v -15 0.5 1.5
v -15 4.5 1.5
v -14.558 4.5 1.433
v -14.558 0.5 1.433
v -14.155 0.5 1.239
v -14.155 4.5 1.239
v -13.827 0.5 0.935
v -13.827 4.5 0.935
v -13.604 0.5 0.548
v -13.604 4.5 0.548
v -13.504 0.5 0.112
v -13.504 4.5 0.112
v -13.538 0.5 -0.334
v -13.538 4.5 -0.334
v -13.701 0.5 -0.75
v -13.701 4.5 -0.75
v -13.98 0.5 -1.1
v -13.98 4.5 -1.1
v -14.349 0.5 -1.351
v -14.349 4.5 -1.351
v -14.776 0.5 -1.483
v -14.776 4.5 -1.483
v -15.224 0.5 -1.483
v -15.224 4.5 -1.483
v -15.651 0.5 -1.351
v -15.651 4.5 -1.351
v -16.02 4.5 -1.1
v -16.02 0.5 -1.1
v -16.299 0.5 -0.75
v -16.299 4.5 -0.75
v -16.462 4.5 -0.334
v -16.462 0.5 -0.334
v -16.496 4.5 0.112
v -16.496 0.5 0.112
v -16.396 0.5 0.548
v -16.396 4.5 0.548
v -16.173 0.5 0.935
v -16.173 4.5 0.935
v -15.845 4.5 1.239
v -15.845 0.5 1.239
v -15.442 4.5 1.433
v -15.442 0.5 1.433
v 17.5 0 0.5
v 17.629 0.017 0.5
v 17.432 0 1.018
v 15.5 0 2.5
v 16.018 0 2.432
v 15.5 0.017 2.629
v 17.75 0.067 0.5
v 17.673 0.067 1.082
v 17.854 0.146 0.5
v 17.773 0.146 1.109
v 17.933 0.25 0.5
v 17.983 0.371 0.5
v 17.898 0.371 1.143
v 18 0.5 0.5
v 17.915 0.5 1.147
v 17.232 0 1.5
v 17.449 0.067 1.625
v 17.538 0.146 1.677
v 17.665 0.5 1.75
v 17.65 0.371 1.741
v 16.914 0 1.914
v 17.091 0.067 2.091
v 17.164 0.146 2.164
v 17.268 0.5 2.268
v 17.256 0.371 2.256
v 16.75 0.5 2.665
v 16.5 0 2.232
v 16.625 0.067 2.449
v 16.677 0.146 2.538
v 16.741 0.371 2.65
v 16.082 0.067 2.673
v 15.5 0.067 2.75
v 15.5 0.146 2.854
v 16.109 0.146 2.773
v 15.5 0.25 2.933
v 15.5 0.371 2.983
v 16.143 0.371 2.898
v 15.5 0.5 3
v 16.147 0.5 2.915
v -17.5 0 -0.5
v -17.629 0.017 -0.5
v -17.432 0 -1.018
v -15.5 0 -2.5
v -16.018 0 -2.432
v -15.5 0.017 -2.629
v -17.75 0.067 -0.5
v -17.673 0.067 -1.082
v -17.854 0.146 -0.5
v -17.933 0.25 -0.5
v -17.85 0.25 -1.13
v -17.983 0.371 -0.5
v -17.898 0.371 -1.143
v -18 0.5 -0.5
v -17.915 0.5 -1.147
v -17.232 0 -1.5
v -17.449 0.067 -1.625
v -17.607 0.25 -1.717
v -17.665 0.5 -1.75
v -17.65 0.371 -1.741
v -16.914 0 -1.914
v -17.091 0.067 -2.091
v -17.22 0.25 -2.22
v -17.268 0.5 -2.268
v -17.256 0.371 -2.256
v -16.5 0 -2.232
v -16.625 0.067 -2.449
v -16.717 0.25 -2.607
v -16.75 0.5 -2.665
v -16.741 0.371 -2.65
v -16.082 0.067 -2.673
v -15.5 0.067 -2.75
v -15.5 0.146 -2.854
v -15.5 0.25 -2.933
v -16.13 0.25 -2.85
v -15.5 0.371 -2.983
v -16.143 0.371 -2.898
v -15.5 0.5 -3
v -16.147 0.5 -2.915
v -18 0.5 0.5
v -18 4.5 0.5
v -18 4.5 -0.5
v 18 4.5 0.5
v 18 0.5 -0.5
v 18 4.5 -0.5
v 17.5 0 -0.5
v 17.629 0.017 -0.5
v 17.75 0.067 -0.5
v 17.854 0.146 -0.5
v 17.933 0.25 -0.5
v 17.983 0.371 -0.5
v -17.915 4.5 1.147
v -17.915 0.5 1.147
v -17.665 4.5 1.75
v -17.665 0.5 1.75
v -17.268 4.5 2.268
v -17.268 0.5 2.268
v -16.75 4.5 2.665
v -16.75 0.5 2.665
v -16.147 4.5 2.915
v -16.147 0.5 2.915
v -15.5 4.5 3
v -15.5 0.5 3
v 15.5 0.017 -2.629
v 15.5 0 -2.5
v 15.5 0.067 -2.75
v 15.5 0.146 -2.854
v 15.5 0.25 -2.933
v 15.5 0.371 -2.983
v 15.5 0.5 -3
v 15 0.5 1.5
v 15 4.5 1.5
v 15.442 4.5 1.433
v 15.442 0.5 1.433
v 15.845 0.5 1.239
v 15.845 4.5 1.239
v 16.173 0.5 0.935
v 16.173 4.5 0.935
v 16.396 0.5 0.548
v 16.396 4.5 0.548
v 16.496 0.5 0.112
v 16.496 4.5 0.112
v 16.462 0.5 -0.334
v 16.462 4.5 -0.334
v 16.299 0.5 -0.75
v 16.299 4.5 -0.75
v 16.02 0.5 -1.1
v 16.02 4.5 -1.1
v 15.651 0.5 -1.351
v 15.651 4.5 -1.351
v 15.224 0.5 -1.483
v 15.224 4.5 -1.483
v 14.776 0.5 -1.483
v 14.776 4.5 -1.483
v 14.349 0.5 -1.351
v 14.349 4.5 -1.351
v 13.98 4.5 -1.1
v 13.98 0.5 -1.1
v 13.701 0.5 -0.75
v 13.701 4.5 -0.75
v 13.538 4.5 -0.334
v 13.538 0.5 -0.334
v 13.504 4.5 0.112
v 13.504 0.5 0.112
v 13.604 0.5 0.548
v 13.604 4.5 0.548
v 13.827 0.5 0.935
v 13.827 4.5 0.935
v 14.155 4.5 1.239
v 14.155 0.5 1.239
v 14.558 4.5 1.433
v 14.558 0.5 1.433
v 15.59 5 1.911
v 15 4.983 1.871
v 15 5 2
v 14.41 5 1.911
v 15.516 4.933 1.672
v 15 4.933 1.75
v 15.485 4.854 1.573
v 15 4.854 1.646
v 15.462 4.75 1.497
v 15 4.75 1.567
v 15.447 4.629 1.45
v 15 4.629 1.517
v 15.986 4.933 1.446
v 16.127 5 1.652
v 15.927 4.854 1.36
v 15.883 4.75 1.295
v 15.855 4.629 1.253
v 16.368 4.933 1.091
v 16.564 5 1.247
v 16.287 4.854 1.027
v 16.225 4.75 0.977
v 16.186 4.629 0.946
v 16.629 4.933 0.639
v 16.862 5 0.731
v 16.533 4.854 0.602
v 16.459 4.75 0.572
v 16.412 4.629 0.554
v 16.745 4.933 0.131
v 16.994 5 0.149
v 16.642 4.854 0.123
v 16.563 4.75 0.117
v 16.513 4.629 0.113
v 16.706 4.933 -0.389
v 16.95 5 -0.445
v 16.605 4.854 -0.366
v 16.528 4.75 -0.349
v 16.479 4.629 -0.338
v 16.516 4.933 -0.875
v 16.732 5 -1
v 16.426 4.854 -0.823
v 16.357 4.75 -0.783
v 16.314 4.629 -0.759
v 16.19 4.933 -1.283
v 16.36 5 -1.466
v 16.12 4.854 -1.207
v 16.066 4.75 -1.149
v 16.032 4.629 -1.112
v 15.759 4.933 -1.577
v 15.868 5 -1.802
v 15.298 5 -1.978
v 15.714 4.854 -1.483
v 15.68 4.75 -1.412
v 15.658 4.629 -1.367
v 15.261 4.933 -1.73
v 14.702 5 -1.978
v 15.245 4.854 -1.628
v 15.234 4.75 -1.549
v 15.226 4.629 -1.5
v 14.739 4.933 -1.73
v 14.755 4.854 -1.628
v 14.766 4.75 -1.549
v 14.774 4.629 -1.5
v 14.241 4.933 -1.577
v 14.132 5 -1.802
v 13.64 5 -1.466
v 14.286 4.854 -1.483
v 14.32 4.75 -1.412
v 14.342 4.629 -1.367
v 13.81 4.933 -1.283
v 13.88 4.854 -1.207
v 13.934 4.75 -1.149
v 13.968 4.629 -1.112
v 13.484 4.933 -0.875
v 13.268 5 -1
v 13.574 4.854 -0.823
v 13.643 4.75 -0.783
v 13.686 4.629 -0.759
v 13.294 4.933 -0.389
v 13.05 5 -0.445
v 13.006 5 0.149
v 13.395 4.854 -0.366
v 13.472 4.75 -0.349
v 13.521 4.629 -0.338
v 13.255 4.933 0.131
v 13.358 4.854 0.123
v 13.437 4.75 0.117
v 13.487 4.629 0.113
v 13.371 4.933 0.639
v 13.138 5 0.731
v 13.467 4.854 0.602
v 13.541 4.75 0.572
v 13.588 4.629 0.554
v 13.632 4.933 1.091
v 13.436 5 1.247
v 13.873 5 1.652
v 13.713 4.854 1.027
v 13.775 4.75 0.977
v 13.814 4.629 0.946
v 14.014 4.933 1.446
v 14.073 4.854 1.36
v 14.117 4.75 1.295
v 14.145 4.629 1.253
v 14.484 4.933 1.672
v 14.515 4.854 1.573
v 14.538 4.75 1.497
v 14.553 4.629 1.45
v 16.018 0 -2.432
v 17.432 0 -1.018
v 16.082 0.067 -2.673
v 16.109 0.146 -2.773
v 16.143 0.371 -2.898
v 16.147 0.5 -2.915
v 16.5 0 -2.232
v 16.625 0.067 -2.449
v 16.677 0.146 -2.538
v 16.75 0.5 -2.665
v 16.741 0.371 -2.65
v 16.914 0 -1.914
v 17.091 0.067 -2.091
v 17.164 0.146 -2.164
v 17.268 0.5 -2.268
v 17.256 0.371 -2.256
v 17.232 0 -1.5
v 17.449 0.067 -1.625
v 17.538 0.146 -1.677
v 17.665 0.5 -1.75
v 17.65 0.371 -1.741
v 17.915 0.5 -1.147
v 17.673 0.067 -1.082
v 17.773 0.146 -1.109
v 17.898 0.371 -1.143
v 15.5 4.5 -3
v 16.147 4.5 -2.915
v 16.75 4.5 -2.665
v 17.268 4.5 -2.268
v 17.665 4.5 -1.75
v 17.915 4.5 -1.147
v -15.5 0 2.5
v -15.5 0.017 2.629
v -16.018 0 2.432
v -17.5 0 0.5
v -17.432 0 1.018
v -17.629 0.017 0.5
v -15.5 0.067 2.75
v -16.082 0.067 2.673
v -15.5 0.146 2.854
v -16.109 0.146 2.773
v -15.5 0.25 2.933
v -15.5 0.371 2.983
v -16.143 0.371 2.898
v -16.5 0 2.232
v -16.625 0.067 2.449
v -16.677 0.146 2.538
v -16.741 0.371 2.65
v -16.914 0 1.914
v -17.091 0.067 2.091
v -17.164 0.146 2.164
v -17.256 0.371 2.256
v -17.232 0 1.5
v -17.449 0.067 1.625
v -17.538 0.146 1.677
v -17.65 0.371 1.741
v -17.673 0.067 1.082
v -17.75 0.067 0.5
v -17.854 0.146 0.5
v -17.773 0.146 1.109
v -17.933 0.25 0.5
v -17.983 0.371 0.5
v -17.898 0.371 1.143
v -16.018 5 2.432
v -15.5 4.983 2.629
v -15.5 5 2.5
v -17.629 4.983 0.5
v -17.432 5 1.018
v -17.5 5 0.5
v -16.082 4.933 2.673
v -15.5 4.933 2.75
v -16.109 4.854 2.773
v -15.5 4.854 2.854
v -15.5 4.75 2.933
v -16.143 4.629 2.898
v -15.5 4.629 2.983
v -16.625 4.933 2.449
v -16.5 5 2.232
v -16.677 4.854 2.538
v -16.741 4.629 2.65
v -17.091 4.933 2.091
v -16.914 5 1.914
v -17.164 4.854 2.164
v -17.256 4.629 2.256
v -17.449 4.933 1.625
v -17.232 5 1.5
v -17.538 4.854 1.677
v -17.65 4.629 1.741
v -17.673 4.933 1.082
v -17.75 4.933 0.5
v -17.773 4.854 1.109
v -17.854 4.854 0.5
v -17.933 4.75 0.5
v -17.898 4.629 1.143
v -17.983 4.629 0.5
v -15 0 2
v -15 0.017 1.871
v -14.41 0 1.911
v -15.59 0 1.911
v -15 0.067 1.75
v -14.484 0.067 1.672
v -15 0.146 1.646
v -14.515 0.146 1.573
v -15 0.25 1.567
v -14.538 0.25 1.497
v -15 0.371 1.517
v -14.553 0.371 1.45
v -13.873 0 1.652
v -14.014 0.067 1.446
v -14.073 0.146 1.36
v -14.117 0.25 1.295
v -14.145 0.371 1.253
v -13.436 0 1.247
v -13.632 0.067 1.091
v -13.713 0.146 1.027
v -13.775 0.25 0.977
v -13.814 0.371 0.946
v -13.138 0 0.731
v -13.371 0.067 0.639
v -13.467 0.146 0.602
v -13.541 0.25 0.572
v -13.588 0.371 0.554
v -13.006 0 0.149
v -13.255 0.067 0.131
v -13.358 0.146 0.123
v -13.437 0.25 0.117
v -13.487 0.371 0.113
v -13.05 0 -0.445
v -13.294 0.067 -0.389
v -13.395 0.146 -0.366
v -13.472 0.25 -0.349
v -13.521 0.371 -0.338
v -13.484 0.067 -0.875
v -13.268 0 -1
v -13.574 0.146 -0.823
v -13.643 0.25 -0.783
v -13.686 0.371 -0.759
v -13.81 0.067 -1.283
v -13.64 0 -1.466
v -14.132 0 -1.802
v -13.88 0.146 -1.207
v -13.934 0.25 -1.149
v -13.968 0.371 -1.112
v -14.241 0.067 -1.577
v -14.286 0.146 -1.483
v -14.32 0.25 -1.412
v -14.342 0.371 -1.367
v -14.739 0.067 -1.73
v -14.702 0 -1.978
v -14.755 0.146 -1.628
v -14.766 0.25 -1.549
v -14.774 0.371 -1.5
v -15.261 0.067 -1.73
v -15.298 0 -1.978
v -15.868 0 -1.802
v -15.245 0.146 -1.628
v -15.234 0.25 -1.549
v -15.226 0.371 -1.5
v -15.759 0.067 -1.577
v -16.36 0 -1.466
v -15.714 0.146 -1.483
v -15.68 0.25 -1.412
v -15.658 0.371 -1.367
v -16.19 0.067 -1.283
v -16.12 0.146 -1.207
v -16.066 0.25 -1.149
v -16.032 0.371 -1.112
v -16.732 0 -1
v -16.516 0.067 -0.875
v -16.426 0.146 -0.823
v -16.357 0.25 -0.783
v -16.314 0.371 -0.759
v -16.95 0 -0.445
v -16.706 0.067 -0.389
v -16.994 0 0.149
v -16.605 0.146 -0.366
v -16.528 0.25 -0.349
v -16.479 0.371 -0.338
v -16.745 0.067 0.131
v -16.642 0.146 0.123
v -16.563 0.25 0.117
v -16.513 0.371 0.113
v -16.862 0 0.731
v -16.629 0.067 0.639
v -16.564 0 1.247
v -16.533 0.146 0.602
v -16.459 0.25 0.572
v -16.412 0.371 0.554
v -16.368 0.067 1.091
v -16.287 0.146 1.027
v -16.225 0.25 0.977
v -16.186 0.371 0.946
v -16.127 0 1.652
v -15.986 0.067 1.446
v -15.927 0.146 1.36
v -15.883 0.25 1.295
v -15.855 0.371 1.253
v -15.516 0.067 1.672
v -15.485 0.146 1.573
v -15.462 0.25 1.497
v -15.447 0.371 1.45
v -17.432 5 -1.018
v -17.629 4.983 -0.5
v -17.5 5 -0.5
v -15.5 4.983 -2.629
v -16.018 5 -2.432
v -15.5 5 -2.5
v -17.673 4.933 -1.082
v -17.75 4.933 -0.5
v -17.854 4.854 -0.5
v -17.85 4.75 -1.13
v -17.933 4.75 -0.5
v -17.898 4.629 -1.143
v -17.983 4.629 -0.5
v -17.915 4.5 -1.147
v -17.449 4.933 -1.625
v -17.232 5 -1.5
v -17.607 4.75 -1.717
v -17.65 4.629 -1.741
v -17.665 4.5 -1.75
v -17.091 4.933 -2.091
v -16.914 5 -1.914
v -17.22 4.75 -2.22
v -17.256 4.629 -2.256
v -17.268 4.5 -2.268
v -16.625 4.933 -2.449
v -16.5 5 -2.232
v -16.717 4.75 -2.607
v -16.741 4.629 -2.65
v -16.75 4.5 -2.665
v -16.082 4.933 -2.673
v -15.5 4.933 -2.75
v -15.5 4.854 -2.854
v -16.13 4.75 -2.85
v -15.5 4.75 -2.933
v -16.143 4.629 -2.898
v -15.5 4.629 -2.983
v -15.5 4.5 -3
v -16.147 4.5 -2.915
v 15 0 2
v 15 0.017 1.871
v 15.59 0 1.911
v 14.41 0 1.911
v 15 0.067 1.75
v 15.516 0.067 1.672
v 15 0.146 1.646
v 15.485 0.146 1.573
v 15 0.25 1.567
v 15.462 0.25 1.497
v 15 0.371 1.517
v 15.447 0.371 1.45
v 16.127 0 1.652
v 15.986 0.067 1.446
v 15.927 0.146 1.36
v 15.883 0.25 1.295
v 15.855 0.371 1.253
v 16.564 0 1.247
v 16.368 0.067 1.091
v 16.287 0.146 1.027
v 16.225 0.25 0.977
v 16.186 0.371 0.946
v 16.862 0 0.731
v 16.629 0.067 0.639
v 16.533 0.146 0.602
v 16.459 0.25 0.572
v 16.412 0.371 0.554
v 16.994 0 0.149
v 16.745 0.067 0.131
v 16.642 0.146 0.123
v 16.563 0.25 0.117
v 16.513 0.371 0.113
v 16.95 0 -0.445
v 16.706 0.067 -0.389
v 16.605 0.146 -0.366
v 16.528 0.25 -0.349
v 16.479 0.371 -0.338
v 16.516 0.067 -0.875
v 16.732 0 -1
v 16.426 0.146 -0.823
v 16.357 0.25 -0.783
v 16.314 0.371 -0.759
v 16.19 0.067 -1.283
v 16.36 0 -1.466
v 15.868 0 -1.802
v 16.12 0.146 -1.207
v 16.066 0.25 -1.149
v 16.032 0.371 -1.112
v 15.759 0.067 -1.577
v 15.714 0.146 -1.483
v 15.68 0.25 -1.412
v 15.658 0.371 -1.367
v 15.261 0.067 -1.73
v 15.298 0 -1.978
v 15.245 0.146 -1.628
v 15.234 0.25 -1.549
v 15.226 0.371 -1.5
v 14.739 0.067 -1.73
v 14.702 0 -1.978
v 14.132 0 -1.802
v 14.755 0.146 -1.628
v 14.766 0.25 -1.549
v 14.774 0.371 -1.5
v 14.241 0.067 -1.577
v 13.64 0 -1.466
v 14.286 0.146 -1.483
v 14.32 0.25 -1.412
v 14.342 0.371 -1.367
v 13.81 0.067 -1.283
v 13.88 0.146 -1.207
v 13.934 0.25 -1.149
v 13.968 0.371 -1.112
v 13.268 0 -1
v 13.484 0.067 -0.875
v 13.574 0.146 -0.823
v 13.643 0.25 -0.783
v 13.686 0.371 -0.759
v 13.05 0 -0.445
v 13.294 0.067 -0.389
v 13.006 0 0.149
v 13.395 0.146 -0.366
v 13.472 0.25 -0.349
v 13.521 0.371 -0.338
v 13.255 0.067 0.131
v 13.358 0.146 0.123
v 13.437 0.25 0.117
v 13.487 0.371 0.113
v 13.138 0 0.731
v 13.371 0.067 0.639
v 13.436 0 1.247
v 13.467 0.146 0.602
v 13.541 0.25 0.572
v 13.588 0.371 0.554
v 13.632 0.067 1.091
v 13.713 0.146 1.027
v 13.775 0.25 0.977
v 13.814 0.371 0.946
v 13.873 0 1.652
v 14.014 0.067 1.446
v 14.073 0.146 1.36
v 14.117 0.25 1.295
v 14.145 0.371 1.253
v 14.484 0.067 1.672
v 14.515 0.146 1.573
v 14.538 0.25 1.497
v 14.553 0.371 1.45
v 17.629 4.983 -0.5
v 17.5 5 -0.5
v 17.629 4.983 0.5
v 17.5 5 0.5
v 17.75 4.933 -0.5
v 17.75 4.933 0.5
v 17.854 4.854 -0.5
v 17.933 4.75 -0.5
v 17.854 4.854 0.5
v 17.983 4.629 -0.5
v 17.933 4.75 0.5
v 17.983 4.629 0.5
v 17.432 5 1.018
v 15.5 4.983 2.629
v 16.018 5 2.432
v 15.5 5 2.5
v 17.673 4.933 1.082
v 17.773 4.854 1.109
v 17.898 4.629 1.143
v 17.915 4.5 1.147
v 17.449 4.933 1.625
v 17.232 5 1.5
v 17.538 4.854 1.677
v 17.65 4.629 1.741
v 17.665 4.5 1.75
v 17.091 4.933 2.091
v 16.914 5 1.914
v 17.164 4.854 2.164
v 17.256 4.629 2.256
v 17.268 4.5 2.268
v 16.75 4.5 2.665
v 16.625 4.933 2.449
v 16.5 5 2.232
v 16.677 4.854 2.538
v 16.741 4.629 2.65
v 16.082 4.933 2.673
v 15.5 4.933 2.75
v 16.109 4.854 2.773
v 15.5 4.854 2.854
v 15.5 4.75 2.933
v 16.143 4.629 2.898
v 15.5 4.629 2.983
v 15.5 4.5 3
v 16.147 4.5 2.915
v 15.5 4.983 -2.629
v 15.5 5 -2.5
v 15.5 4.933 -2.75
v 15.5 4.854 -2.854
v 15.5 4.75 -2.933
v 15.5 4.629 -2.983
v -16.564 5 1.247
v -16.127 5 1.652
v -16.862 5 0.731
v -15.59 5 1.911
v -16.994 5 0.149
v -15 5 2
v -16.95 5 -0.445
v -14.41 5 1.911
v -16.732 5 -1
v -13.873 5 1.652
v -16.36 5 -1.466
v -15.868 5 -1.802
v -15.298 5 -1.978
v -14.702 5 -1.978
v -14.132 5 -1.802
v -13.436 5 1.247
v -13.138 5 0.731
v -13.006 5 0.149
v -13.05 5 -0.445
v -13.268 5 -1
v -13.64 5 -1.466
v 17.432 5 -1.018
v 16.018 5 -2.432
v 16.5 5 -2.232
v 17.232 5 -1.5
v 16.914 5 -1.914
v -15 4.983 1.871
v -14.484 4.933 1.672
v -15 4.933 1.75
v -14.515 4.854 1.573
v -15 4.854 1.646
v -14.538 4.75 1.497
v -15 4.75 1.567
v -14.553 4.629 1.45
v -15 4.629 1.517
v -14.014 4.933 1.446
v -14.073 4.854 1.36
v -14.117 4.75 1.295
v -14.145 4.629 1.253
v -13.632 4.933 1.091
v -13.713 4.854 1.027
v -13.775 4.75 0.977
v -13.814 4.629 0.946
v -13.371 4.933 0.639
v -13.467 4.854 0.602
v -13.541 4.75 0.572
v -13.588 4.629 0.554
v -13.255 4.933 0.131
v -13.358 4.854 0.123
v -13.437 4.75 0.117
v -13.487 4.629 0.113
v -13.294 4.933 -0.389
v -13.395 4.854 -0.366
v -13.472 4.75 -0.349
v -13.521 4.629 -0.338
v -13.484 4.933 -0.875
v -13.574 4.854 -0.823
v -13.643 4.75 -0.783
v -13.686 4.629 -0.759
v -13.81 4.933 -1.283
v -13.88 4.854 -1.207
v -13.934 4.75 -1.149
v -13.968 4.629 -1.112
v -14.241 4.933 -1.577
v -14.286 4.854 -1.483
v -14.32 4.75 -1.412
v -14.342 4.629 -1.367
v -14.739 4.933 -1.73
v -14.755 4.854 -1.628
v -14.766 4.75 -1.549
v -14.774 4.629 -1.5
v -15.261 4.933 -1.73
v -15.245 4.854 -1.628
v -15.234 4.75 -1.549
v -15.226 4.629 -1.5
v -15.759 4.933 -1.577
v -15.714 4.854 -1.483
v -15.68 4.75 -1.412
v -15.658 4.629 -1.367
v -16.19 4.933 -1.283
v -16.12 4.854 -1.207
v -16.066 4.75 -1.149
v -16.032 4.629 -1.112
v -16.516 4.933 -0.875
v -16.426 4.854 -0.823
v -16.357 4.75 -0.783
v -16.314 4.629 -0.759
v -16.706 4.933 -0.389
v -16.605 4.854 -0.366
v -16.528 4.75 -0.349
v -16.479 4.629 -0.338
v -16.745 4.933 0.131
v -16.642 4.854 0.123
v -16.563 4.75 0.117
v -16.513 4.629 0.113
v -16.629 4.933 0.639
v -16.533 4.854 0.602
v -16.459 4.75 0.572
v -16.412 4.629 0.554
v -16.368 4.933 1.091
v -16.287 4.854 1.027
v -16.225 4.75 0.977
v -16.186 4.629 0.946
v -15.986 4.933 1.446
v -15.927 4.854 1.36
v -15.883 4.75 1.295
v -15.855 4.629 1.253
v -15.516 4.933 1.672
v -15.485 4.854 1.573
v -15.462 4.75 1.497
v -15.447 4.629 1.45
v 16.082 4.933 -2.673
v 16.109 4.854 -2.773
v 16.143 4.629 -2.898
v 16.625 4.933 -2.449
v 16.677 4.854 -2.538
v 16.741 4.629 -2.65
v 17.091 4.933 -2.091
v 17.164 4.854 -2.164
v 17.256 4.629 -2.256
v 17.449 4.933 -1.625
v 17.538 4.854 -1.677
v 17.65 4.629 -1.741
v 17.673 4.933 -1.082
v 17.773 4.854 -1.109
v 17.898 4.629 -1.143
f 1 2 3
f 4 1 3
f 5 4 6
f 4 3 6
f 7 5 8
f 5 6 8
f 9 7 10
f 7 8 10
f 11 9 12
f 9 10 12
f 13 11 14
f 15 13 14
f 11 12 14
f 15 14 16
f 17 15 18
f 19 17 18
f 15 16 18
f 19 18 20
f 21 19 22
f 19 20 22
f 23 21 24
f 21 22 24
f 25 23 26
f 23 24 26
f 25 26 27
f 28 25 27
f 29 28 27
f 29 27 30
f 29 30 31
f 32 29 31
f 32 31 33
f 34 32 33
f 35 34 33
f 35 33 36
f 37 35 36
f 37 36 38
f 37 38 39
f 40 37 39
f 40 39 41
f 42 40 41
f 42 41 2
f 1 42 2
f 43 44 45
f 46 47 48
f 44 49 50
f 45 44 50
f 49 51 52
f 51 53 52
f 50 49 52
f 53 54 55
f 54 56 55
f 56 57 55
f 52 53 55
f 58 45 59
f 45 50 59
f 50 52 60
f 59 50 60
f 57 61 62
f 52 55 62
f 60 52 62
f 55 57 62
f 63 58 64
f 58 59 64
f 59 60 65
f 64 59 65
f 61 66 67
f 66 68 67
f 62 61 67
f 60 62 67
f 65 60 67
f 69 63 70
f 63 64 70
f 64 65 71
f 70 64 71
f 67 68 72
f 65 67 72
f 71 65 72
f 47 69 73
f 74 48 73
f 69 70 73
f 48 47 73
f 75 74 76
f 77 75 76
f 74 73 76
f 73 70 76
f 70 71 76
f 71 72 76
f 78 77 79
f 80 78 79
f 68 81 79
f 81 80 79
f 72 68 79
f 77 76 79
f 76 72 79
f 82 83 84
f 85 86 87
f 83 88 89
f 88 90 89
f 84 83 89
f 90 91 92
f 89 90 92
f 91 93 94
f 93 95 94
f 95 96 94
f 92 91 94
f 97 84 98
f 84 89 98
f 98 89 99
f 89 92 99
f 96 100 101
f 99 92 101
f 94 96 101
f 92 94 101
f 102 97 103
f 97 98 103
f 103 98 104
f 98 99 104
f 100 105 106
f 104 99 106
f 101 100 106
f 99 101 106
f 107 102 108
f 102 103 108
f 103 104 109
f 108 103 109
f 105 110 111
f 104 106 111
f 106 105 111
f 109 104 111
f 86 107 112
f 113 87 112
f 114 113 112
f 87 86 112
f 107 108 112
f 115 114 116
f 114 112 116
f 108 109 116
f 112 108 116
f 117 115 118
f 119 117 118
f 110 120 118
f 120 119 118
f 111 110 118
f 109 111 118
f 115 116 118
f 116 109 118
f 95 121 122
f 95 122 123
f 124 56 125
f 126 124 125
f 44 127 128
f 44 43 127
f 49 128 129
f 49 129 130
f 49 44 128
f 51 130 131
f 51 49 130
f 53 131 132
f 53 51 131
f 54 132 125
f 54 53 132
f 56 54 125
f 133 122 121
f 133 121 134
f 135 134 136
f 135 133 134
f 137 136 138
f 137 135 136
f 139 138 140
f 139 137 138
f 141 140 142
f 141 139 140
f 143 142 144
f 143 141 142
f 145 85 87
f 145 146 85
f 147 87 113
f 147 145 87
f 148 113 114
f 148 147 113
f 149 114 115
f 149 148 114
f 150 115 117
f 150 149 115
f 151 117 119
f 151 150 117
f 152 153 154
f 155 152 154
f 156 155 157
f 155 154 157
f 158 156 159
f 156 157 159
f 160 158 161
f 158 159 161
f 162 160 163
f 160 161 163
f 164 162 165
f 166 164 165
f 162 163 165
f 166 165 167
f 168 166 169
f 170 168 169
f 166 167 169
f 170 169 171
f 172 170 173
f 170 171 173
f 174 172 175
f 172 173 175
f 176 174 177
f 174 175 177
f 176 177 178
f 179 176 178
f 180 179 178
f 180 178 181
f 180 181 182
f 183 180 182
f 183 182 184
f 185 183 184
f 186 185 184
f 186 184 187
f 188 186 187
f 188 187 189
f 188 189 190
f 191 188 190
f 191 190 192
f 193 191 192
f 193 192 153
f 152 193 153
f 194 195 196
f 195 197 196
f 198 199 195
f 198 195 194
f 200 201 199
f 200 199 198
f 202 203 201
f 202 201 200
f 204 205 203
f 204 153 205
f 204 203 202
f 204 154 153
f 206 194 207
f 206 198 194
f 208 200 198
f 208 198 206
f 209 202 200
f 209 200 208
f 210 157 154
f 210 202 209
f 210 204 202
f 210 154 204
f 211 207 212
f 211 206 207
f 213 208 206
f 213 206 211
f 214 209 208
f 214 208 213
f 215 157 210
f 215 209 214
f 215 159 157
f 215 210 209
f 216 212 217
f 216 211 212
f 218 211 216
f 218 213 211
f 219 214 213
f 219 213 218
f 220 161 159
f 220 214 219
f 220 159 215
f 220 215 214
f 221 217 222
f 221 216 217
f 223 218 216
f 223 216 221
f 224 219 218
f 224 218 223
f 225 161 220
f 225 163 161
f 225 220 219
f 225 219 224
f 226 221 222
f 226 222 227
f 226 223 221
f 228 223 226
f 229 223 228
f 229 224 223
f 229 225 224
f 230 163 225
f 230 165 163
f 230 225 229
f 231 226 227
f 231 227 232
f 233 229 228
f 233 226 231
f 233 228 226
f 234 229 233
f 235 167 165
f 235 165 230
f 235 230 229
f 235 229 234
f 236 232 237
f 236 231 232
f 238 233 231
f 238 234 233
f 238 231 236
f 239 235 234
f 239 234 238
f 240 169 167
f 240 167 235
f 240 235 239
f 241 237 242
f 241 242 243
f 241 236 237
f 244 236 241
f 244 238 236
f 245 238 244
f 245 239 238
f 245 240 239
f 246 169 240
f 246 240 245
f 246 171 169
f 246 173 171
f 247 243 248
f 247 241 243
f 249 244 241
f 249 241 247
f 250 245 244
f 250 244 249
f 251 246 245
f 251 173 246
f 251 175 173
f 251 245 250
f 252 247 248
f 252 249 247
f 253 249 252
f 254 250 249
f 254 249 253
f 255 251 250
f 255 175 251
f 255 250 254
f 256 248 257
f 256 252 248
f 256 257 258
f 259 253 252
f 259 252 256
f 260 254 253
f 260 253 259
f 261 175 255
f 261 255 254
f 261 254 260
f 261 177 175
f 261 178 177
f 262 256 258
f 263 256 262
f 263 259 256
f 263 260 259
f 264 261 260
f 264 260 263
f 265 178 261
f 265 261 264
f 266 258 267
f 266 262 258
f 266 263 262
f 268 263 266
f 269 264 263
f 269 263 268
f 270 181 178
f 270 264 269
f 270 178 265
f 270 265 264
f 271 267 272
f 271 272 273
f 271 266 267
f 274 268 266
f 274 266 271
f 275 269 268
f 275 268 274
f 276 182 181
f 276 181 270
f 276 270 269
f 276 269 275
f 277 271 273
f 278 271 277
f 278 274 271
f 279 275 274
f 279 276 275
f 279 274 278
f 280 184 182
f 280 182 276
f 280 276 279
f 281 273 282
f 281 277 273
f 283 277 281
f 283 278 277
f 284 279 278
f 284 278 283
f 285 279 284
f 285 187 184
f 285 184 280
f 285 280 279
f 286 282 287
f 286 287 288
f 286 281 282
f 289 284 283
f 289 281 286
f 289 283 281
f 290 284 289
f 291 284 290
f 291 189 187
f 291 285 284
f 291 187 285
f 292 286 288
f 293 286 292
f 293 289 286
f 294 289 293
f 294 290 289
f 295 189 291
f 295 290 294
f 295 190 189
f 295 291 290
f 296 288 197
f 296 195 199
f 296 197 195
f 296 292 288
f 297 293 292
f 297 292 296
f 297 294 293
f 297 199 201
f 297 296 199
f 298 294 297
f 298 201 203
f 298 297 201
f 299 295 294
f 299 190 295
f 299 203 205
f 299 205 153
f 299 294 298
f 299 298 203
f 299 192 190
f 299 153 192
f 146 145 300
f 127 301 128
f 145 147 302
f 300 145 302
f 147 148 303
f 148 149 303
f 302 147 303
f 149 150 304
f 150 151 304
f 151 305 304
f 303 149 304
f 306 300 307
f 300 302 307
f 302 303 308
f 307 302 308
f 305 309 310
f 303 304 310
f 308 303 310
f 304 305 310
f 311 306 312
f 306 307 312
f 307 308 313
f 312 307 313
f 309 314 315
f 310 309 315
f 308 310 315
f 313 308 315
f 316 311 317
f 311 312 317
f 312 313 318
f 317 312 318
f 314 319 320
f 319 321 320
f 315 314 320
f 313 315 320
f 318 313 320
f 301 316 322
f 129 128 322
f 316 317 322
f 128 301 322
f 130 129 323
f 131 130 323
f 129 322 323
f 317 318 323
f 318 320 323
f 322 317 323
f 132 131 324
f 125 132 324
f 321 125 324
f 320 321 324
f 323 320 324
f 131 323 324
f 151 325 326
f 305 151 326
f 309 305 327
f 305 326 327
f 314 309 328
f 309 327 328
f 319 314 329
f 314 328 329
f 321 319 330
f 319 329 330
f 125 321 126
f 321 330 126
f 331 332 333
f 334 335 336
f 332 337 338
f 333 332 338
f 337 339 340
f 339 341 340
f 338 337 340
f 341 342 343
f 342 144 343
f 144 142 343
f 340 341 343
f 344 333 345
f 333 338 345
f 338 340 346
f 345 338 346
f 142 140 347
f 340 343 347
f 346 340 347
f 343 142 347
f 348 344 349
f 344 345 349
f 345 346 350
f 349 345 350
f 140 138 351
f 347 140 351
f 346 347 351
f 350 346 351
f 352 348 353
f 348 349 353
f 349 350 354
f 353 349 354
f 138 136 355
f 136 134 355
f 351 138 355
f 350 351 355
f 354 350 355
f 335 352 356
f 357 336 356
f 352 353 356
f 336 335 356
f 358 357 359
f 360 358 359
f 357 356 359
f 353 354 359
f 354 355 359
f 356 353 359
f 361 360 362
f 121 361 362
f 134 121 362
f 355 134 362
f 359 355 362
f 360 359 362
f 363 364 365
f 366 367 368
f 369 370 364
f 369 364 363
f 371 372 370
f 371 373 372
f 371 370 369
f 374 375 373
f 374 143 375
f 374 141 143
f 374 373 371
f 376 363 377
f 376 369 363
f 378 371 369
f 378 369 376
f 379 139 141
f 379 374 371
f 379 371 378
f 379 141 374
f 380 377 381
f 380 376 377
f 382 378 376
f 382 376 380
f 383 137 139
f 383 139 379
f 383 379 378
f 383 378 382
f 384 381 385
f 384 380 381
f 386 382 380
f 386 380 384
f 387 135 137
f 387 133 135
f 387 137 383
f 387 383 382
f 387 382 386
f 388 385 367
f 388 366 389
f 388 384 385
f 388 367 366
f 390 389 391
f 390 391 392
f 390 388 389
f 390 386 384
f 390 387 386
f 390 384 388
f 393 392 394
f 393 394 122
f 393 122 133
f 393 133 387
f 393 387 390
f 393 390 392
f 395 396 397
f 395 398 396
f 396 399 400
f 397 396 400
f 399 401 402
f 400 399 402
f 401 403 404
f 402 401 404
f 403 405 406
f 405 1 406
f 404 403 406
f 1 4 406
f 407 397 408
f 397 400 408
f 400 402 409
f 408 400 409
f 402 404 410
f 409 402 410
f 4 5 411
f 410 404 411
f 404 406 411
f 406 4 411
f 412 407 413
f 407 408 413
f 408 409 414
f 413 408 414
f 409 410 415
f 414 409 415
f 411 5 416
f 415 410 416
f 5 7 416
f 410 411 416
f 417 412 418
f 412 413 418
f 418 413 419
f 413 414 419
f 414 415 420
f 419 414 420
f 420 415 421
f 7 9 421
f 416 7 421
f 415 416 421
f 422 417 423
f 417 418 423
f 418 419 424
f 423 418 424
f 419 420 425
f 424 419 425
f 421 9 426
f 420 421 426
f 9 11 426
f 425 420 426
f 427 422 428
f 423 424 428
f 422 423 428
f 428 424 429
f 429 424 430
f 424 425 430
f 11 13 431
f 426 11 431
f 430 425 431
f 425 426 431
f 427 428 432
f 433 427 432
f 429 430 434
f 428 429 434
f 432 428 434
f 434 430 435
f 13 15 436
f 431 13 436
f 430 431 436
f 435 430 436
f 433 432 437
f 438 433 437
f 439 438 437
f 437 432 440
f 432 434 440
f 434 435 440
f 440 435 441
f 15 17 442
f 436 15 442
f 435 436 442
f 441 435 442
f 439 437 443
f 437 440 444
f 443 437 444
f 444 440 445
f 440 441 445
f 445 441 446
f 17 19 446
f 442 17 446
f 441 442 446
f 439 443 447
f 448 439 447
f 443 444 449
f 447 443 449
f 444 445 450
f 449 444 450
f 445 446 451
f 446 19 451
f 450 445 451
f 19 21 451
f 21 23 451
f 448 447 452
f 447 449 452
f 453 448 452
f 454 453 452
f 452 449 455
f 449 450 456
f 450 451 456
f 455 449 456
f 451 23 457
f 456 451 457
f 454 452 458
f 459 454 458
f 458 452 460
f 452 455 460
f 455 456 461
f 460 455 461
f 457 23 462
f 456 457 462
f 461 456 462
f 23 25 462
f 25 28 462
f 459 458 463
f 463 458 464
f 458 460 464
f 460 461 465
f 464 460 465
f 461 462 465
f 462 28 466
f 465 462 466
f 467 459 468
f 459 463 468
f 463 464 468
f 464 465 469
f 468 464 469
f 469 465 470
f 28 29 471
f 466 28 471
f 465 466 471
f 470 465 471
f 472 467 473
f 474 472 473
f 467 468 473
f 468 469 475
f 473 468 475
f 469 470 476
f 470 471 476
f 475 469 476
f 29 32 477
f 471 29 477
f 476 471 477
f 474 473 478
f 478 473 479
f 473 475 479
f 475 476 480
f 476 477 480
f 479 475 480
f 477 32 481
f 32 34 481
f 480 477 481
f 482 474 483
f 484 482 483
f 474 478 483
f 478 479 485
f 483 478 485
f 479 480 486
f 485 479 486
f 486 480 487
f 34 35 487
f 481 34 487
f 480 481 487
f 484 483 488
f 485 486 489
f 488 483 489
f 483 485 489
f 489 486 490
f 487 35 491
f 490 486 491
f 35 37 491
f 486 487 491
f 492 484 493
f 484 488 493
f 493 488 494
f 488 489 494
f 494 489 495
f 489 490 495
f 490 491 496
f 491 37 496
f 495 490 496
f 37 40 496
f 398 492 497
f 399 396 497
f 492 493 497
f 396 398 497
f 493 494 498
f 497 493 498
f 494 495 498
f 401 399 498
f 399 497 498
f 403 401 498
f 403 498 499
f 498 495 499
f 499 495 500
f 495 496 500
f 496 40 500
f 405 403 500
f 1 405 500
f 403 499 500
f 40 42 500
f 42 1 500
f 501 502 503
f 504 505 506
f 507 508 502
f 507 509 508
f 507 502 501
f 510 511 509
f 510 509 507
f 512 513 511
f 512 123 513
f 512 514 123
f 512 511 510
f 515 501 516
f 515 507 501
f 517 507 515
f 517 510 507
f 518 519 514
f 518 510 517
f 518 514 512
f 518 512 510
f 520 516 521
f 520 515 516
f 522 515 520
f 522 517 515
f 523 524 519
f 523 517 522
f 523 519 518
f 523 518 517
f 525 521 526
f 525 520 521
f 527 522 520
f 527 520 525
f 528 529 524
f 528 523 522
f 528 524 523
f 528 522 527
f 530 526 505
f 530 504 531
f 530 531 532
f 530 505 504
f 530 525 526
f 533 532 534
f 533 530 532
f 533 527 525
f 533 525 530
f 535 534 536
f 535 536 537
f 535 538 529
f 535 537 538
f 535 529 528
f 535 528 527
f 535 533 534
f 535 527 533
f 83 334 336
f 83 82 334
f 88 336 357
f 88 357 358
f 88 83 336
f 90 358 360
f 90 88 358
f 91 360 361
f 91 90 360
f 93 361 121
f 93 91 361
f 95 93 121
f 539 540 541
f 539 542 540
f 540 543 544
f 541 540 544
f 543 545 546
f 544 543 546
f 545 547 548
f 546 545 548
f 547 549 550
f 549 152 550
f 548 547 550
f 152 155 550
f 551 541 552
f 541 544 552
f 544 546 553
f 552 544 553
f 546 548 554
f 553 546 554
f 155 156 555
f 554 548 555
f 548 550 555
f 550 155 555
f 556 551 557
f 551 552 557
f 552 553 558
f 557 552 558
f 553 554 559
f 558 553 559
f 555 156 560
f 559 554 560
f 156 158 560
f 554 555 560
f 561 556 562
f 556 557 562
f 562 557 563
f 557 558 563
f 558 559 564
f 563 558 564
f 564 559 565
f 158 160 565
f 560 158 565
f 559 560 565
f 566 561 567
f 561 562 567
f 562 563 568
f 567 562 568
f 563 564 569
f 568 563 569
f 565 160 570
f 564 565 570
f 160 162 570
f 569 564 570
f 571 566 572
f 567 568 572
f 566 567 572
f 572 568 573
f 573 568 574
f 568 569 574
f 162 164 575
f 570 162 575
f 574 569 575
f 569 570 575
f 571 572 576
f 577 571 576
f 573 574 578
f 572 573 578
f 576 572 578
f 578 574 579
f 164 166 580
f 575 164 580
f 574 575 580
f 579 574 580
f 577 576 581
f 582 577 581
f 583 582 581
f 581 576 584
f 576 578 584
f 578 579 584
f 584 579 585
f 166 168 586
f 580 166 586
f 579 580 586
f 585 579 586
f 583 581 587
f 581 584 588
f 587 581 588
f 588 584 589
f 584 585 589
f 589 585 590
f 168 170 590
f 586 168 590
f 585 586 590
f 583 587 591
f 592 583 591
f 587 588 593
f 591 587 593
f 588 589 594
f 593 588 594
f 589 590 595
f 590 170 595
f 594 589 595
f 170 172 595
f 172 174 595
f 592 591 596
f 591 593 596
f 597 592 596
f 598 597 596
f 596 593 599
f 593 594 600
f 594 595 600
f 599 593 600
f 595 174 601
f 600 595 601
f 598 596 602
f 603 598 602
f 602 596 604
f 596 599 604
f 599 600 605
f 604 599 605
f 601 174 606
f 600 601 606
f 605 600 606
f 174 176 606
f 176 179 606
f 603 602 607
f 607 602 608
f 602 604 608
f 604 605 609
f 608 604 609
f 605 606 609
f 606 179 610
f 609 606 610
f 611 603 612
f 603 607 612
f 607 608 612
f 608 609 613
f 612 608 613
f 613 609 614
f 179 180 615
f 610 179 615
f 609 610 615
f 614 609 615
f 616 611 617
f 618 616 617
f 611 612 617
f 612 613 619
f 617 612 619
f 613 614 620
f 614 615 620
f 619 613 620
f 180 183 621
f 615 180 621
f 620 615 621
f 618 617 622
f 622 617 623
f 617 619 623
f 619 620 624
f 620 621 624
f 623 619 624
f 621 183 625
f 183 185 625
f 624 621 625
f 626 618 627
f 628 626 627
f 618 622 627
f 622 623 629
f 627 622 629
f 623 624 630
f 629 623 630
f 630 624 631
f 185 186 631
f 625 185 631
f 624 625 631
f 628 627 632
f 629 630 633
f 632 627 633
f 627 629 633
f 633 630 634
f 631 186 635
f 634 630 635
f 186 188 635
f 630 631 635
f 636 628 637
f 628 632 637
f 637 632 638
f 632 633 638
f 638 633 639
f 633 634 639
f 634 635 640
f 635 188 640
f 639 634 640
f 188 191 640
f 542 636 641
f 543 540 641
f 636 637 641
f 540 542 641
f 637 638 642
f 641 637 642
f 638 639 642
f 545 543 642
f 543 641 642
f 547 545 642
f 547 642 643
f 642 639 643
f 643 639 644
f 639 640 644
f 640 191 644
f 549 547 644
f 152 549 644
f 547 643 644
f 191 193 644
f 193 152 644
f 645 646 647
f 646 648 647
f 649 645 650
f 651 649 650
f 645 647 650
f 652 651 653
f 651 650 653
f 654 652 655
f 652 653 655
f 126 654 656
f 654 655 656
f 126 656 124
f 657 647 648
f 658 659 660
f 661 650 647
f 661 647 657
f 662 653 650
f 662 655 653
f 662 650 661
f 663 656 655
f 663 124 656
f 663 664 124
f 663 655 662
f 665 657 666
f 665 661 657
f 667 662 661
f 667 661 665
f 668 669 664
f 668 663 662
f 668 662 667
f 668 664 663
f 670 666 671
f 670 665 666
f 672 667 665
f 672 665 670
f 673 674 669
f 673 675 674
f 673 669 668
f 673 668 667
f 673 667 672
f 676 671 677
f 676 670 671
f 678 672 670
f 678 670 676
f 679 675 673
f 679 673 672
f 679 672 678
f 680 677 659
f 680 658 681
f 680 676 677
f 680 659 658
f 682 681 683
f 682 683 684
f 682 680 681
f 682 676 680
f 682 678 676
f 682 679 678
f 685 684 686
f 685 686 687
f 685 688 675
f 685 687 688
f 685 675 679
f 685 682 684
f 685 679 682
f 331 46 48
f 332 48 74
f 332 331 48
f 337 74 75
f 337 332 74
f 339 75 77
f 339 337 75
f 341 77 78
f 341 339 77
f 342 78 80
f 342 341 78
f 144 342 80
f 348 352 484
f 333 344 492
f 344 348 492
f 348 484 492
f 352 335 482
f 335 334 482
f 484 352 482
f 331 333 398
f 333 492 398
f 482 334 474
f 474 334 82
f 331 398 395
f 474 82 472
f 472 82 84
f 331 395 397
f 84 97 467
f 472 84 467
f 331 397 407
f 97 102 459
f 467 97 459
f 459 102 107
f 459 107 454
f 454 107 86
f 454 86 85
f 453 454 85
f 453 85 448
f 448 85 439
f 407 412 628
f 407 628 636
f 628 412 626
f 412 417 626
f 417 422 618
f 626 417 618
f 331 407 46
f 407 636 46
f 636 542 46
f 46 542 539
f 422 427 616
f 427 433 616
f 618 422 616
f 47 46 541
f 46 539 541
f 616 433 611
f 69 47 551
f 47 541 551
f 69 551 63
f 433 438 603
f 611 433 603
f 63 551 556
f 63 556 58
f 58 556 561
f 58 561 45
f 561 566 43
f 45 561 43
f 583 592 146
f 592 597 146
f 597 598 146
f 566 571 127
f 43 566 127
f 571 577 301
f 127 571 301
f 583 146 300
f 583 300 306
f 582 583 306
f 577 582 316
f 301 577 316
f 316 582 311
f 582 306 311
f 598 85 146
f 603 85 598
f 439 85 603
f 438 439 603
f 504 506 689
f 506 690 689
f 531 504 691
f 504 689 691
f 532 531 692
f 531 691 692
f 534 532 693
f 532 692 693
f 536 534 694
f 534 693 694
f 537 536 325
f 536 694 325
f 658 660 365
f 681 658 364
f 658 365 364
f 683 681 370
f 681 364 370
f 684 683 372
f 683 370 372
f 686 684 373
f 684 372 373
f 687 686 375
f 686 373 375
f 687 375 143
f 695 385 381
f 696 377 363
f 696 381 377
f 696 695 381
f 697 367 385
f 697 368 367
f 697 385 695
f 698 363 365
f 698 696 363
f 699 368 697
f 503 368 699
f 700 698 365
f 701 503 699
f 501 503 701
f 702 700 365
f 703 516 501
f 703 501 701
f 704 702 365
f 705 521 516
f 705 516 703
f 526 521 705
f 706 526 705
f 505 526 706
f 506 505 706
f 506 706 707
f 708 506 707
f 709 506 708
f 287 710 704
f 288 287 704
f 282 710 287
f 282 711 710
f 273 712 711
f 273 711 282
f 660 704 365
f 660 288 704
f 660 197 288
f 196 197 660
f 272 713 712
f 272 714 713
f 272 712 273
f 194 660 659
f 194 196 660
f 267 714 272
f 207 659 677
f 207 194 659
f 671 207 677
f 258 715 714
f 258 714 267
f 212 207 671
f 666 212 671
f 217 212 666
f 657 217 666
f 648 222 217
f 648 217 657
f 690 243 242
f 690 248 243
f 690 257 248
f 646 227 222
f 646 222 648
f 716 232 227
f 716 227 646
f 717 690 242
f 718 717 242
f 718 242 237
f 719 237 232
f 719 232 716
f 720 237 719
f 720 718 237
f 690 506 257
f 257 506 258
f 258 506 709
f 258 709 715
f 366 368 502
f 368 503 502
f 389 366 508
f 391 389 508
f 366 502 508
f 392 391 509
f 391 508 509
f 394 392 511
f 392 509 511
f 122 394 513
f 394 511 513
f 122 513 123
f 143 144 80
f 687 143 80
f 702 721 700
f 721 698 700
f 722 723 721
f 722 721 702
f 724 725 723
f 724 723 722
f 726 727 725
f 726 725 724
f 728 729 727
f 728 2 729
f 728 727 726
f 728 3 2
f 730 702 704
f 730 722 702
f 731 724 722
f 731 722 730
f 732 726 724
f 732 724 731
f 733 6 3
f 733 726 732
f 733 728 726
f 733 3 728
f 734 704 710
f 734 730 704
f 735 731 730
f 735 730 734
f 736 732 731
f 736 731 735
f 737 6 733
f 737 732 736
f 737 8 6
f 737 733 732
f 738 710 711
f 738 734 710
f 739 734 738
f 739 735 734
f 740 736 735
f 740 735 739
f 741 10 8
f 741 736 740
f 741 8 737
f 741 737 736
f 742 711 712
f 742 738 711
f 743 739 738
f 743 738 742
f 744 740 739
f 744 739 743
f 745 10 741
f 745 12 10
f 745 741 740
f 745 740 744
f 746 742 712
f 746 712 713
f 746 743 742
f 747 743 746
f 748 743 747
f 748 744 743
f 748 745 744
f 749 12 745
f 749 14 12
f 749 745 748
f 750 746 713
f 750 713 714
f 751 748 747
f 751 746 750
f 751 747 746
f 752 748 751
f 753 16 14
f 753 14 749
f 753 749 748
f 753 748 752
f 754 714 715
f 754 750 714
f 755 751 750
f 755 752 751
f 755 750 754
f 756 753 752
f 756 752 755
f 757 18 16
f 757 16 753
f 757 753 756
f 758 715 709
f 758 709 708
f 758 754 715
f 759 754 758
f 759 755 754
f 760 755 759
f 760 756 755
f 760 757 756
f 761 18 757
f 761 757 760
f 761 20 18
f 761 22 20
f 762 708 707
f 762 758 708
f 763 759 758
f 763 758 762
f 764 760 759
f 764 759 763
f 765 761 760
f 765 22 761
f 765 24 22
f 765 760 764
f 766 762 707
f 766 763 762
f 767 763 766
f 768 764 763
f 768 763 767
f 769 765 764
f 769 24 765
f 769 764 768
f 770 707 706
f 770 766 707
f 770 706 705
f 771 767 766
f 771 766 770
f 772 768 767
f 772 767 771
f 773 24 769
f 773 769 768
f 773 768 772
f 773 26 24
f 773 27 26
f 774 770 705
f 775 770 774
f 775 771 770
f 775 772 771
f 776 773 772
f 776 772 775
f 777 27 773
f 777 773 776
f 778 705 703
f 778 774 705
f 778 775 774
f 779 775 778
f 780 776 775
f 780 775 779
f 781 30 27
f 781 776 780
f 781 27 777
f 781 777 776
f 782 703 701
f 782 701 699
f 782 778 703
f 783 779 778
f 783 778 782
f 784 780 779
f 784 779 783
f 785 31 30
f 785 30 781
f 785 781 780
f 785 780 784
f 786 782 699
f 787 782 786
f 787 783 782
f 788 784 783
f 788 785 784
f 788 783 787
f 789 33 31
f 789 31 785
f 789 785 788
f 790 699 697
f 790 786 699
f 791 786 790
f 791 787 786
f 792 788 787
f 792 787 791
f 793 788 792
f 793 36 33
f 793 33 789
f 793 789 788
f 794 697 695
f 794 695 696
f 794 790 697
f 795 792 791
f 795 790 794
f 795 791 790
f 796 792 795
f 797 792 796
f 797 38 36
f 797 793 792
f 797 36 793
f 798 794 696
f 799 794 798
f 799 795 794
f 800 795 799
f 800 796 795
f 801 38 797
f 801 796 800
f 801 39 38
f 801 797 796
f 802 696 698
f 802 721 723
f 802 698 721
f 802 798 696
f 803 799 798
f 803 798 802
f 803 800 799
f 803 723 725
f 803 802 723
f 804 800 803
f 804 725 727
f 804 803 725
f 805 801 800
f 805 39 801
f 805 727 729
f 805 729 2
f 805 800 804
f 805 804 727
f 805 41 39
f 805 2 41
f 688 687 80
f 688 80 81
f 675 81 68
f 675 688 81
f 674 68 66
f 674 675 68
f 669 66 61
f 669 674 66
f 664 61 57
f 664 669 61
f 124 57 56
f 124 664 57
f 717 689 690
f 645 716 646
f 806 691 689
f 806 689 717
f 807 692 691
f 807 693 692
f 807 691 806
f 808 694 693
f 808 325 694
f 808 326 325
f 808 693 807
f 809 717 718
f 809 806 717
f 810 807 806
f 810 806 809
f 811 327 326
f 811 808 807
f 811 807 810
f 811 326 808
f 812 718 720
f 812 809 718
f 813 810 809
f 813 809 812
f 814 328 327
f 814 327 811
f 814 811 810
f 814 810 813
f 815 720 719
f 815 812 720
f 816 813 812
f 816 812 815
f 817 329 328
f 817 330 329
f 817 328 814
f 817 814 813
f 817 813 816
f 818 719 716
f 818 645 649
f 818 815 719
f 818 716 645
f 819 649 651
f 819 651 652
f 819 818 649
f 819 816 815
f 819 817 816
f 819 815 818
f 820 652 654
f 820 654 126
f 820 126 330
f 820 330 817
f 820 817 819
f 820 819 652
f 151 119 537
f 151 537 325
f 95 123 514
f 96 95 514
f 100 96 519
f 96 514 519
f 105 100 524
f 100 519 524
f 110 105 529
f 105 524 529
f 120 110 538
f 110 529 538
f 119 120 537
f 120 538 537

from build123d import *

# Parameters (mm, degrees)
SKETCH1_W           = 36
SKETCH1_H           = 6
BOSS_EXTRUDE1_DEPTH = 5
SKETCH2_R           = 1.5
CUT_EXTRUDE1_DEPTH  = 19.920887928
FILLET1_R           = 2.5
FILLET2_R           = 0.5


with BuildPart() as part:
    # Sketch1 → Boss-Extrude1 (new body)
    with BuildSketch(Plane(origin=(0, 0, 0), x_dir=(1, 0, 0), z_dir=(0, 1, 0))):
        Rectangle(SKETCH1_W, SKETCH1_H)
    extrude(amount=BOSS_EXTRUDE1_DEPTH)

    # Sketch2 → Cut-Extrude1 (cut, through all)
    with BuildSketch(Plane(origin=(0, 5, 0), x_dir=(1, 0, 0), z_dir=(0, 1, 0))):
        with Locations(Location((-15, 0, 0), (0, 0, 270))):
            Circle(SKETCH2_R)
        with Locations(Location((15, 0, 0), (0, 0, 270))):
            Circle(SKETCH2_R)
    extrude(amount=-CUT_EXTRUDE1_DEPTH, mode=Mode.SUBTRACT)

    # Fillet1
    fillet1_edges = [part.edges().sort_by_distance(p)[0] for p in [
        (18, 2.5, 3),
        (-18, 2.5, 3),
        (-18, 2.5, -3),
        (18, 2.5, -3),
    ]]
    fillet(fillet1_edges, radius=FILLET1_R)

    # Fillet2
    fillet2_edges = [part.edges().sort_by_distance(p)[0] for p in [
        (-15, 0, -1.5),
        (-15, 5, -1.5),
        (15, 0, -1.5),
        (15, 5, -1.5),
        (0, 0, -3),
        (0, 5, -3),
        (18, 0, 0),
        (0, 0, 3),
        (-18, 0, 0),
        (-17.267766953, 0, 2.267766953),
        (-17.267766953, 0, -2.267766953),
        (17.267766953, 0, 2.267766953),
        (17.267766953, 0, -2.267766953),
        (18, 5, 0),
        (-18, 5, 0),
        (0, 5, 3),
        (-17.267766953, 5, 2.267766953),
        (-17.267766953, 5, -2.267766953),
        (17.267766953, 5, 2.267766953),
        (17.267766953, 5, -2.267766953),
    ]]
    fillet(fillet2_edges, radius=FILLET2_R)


solid = part.part
